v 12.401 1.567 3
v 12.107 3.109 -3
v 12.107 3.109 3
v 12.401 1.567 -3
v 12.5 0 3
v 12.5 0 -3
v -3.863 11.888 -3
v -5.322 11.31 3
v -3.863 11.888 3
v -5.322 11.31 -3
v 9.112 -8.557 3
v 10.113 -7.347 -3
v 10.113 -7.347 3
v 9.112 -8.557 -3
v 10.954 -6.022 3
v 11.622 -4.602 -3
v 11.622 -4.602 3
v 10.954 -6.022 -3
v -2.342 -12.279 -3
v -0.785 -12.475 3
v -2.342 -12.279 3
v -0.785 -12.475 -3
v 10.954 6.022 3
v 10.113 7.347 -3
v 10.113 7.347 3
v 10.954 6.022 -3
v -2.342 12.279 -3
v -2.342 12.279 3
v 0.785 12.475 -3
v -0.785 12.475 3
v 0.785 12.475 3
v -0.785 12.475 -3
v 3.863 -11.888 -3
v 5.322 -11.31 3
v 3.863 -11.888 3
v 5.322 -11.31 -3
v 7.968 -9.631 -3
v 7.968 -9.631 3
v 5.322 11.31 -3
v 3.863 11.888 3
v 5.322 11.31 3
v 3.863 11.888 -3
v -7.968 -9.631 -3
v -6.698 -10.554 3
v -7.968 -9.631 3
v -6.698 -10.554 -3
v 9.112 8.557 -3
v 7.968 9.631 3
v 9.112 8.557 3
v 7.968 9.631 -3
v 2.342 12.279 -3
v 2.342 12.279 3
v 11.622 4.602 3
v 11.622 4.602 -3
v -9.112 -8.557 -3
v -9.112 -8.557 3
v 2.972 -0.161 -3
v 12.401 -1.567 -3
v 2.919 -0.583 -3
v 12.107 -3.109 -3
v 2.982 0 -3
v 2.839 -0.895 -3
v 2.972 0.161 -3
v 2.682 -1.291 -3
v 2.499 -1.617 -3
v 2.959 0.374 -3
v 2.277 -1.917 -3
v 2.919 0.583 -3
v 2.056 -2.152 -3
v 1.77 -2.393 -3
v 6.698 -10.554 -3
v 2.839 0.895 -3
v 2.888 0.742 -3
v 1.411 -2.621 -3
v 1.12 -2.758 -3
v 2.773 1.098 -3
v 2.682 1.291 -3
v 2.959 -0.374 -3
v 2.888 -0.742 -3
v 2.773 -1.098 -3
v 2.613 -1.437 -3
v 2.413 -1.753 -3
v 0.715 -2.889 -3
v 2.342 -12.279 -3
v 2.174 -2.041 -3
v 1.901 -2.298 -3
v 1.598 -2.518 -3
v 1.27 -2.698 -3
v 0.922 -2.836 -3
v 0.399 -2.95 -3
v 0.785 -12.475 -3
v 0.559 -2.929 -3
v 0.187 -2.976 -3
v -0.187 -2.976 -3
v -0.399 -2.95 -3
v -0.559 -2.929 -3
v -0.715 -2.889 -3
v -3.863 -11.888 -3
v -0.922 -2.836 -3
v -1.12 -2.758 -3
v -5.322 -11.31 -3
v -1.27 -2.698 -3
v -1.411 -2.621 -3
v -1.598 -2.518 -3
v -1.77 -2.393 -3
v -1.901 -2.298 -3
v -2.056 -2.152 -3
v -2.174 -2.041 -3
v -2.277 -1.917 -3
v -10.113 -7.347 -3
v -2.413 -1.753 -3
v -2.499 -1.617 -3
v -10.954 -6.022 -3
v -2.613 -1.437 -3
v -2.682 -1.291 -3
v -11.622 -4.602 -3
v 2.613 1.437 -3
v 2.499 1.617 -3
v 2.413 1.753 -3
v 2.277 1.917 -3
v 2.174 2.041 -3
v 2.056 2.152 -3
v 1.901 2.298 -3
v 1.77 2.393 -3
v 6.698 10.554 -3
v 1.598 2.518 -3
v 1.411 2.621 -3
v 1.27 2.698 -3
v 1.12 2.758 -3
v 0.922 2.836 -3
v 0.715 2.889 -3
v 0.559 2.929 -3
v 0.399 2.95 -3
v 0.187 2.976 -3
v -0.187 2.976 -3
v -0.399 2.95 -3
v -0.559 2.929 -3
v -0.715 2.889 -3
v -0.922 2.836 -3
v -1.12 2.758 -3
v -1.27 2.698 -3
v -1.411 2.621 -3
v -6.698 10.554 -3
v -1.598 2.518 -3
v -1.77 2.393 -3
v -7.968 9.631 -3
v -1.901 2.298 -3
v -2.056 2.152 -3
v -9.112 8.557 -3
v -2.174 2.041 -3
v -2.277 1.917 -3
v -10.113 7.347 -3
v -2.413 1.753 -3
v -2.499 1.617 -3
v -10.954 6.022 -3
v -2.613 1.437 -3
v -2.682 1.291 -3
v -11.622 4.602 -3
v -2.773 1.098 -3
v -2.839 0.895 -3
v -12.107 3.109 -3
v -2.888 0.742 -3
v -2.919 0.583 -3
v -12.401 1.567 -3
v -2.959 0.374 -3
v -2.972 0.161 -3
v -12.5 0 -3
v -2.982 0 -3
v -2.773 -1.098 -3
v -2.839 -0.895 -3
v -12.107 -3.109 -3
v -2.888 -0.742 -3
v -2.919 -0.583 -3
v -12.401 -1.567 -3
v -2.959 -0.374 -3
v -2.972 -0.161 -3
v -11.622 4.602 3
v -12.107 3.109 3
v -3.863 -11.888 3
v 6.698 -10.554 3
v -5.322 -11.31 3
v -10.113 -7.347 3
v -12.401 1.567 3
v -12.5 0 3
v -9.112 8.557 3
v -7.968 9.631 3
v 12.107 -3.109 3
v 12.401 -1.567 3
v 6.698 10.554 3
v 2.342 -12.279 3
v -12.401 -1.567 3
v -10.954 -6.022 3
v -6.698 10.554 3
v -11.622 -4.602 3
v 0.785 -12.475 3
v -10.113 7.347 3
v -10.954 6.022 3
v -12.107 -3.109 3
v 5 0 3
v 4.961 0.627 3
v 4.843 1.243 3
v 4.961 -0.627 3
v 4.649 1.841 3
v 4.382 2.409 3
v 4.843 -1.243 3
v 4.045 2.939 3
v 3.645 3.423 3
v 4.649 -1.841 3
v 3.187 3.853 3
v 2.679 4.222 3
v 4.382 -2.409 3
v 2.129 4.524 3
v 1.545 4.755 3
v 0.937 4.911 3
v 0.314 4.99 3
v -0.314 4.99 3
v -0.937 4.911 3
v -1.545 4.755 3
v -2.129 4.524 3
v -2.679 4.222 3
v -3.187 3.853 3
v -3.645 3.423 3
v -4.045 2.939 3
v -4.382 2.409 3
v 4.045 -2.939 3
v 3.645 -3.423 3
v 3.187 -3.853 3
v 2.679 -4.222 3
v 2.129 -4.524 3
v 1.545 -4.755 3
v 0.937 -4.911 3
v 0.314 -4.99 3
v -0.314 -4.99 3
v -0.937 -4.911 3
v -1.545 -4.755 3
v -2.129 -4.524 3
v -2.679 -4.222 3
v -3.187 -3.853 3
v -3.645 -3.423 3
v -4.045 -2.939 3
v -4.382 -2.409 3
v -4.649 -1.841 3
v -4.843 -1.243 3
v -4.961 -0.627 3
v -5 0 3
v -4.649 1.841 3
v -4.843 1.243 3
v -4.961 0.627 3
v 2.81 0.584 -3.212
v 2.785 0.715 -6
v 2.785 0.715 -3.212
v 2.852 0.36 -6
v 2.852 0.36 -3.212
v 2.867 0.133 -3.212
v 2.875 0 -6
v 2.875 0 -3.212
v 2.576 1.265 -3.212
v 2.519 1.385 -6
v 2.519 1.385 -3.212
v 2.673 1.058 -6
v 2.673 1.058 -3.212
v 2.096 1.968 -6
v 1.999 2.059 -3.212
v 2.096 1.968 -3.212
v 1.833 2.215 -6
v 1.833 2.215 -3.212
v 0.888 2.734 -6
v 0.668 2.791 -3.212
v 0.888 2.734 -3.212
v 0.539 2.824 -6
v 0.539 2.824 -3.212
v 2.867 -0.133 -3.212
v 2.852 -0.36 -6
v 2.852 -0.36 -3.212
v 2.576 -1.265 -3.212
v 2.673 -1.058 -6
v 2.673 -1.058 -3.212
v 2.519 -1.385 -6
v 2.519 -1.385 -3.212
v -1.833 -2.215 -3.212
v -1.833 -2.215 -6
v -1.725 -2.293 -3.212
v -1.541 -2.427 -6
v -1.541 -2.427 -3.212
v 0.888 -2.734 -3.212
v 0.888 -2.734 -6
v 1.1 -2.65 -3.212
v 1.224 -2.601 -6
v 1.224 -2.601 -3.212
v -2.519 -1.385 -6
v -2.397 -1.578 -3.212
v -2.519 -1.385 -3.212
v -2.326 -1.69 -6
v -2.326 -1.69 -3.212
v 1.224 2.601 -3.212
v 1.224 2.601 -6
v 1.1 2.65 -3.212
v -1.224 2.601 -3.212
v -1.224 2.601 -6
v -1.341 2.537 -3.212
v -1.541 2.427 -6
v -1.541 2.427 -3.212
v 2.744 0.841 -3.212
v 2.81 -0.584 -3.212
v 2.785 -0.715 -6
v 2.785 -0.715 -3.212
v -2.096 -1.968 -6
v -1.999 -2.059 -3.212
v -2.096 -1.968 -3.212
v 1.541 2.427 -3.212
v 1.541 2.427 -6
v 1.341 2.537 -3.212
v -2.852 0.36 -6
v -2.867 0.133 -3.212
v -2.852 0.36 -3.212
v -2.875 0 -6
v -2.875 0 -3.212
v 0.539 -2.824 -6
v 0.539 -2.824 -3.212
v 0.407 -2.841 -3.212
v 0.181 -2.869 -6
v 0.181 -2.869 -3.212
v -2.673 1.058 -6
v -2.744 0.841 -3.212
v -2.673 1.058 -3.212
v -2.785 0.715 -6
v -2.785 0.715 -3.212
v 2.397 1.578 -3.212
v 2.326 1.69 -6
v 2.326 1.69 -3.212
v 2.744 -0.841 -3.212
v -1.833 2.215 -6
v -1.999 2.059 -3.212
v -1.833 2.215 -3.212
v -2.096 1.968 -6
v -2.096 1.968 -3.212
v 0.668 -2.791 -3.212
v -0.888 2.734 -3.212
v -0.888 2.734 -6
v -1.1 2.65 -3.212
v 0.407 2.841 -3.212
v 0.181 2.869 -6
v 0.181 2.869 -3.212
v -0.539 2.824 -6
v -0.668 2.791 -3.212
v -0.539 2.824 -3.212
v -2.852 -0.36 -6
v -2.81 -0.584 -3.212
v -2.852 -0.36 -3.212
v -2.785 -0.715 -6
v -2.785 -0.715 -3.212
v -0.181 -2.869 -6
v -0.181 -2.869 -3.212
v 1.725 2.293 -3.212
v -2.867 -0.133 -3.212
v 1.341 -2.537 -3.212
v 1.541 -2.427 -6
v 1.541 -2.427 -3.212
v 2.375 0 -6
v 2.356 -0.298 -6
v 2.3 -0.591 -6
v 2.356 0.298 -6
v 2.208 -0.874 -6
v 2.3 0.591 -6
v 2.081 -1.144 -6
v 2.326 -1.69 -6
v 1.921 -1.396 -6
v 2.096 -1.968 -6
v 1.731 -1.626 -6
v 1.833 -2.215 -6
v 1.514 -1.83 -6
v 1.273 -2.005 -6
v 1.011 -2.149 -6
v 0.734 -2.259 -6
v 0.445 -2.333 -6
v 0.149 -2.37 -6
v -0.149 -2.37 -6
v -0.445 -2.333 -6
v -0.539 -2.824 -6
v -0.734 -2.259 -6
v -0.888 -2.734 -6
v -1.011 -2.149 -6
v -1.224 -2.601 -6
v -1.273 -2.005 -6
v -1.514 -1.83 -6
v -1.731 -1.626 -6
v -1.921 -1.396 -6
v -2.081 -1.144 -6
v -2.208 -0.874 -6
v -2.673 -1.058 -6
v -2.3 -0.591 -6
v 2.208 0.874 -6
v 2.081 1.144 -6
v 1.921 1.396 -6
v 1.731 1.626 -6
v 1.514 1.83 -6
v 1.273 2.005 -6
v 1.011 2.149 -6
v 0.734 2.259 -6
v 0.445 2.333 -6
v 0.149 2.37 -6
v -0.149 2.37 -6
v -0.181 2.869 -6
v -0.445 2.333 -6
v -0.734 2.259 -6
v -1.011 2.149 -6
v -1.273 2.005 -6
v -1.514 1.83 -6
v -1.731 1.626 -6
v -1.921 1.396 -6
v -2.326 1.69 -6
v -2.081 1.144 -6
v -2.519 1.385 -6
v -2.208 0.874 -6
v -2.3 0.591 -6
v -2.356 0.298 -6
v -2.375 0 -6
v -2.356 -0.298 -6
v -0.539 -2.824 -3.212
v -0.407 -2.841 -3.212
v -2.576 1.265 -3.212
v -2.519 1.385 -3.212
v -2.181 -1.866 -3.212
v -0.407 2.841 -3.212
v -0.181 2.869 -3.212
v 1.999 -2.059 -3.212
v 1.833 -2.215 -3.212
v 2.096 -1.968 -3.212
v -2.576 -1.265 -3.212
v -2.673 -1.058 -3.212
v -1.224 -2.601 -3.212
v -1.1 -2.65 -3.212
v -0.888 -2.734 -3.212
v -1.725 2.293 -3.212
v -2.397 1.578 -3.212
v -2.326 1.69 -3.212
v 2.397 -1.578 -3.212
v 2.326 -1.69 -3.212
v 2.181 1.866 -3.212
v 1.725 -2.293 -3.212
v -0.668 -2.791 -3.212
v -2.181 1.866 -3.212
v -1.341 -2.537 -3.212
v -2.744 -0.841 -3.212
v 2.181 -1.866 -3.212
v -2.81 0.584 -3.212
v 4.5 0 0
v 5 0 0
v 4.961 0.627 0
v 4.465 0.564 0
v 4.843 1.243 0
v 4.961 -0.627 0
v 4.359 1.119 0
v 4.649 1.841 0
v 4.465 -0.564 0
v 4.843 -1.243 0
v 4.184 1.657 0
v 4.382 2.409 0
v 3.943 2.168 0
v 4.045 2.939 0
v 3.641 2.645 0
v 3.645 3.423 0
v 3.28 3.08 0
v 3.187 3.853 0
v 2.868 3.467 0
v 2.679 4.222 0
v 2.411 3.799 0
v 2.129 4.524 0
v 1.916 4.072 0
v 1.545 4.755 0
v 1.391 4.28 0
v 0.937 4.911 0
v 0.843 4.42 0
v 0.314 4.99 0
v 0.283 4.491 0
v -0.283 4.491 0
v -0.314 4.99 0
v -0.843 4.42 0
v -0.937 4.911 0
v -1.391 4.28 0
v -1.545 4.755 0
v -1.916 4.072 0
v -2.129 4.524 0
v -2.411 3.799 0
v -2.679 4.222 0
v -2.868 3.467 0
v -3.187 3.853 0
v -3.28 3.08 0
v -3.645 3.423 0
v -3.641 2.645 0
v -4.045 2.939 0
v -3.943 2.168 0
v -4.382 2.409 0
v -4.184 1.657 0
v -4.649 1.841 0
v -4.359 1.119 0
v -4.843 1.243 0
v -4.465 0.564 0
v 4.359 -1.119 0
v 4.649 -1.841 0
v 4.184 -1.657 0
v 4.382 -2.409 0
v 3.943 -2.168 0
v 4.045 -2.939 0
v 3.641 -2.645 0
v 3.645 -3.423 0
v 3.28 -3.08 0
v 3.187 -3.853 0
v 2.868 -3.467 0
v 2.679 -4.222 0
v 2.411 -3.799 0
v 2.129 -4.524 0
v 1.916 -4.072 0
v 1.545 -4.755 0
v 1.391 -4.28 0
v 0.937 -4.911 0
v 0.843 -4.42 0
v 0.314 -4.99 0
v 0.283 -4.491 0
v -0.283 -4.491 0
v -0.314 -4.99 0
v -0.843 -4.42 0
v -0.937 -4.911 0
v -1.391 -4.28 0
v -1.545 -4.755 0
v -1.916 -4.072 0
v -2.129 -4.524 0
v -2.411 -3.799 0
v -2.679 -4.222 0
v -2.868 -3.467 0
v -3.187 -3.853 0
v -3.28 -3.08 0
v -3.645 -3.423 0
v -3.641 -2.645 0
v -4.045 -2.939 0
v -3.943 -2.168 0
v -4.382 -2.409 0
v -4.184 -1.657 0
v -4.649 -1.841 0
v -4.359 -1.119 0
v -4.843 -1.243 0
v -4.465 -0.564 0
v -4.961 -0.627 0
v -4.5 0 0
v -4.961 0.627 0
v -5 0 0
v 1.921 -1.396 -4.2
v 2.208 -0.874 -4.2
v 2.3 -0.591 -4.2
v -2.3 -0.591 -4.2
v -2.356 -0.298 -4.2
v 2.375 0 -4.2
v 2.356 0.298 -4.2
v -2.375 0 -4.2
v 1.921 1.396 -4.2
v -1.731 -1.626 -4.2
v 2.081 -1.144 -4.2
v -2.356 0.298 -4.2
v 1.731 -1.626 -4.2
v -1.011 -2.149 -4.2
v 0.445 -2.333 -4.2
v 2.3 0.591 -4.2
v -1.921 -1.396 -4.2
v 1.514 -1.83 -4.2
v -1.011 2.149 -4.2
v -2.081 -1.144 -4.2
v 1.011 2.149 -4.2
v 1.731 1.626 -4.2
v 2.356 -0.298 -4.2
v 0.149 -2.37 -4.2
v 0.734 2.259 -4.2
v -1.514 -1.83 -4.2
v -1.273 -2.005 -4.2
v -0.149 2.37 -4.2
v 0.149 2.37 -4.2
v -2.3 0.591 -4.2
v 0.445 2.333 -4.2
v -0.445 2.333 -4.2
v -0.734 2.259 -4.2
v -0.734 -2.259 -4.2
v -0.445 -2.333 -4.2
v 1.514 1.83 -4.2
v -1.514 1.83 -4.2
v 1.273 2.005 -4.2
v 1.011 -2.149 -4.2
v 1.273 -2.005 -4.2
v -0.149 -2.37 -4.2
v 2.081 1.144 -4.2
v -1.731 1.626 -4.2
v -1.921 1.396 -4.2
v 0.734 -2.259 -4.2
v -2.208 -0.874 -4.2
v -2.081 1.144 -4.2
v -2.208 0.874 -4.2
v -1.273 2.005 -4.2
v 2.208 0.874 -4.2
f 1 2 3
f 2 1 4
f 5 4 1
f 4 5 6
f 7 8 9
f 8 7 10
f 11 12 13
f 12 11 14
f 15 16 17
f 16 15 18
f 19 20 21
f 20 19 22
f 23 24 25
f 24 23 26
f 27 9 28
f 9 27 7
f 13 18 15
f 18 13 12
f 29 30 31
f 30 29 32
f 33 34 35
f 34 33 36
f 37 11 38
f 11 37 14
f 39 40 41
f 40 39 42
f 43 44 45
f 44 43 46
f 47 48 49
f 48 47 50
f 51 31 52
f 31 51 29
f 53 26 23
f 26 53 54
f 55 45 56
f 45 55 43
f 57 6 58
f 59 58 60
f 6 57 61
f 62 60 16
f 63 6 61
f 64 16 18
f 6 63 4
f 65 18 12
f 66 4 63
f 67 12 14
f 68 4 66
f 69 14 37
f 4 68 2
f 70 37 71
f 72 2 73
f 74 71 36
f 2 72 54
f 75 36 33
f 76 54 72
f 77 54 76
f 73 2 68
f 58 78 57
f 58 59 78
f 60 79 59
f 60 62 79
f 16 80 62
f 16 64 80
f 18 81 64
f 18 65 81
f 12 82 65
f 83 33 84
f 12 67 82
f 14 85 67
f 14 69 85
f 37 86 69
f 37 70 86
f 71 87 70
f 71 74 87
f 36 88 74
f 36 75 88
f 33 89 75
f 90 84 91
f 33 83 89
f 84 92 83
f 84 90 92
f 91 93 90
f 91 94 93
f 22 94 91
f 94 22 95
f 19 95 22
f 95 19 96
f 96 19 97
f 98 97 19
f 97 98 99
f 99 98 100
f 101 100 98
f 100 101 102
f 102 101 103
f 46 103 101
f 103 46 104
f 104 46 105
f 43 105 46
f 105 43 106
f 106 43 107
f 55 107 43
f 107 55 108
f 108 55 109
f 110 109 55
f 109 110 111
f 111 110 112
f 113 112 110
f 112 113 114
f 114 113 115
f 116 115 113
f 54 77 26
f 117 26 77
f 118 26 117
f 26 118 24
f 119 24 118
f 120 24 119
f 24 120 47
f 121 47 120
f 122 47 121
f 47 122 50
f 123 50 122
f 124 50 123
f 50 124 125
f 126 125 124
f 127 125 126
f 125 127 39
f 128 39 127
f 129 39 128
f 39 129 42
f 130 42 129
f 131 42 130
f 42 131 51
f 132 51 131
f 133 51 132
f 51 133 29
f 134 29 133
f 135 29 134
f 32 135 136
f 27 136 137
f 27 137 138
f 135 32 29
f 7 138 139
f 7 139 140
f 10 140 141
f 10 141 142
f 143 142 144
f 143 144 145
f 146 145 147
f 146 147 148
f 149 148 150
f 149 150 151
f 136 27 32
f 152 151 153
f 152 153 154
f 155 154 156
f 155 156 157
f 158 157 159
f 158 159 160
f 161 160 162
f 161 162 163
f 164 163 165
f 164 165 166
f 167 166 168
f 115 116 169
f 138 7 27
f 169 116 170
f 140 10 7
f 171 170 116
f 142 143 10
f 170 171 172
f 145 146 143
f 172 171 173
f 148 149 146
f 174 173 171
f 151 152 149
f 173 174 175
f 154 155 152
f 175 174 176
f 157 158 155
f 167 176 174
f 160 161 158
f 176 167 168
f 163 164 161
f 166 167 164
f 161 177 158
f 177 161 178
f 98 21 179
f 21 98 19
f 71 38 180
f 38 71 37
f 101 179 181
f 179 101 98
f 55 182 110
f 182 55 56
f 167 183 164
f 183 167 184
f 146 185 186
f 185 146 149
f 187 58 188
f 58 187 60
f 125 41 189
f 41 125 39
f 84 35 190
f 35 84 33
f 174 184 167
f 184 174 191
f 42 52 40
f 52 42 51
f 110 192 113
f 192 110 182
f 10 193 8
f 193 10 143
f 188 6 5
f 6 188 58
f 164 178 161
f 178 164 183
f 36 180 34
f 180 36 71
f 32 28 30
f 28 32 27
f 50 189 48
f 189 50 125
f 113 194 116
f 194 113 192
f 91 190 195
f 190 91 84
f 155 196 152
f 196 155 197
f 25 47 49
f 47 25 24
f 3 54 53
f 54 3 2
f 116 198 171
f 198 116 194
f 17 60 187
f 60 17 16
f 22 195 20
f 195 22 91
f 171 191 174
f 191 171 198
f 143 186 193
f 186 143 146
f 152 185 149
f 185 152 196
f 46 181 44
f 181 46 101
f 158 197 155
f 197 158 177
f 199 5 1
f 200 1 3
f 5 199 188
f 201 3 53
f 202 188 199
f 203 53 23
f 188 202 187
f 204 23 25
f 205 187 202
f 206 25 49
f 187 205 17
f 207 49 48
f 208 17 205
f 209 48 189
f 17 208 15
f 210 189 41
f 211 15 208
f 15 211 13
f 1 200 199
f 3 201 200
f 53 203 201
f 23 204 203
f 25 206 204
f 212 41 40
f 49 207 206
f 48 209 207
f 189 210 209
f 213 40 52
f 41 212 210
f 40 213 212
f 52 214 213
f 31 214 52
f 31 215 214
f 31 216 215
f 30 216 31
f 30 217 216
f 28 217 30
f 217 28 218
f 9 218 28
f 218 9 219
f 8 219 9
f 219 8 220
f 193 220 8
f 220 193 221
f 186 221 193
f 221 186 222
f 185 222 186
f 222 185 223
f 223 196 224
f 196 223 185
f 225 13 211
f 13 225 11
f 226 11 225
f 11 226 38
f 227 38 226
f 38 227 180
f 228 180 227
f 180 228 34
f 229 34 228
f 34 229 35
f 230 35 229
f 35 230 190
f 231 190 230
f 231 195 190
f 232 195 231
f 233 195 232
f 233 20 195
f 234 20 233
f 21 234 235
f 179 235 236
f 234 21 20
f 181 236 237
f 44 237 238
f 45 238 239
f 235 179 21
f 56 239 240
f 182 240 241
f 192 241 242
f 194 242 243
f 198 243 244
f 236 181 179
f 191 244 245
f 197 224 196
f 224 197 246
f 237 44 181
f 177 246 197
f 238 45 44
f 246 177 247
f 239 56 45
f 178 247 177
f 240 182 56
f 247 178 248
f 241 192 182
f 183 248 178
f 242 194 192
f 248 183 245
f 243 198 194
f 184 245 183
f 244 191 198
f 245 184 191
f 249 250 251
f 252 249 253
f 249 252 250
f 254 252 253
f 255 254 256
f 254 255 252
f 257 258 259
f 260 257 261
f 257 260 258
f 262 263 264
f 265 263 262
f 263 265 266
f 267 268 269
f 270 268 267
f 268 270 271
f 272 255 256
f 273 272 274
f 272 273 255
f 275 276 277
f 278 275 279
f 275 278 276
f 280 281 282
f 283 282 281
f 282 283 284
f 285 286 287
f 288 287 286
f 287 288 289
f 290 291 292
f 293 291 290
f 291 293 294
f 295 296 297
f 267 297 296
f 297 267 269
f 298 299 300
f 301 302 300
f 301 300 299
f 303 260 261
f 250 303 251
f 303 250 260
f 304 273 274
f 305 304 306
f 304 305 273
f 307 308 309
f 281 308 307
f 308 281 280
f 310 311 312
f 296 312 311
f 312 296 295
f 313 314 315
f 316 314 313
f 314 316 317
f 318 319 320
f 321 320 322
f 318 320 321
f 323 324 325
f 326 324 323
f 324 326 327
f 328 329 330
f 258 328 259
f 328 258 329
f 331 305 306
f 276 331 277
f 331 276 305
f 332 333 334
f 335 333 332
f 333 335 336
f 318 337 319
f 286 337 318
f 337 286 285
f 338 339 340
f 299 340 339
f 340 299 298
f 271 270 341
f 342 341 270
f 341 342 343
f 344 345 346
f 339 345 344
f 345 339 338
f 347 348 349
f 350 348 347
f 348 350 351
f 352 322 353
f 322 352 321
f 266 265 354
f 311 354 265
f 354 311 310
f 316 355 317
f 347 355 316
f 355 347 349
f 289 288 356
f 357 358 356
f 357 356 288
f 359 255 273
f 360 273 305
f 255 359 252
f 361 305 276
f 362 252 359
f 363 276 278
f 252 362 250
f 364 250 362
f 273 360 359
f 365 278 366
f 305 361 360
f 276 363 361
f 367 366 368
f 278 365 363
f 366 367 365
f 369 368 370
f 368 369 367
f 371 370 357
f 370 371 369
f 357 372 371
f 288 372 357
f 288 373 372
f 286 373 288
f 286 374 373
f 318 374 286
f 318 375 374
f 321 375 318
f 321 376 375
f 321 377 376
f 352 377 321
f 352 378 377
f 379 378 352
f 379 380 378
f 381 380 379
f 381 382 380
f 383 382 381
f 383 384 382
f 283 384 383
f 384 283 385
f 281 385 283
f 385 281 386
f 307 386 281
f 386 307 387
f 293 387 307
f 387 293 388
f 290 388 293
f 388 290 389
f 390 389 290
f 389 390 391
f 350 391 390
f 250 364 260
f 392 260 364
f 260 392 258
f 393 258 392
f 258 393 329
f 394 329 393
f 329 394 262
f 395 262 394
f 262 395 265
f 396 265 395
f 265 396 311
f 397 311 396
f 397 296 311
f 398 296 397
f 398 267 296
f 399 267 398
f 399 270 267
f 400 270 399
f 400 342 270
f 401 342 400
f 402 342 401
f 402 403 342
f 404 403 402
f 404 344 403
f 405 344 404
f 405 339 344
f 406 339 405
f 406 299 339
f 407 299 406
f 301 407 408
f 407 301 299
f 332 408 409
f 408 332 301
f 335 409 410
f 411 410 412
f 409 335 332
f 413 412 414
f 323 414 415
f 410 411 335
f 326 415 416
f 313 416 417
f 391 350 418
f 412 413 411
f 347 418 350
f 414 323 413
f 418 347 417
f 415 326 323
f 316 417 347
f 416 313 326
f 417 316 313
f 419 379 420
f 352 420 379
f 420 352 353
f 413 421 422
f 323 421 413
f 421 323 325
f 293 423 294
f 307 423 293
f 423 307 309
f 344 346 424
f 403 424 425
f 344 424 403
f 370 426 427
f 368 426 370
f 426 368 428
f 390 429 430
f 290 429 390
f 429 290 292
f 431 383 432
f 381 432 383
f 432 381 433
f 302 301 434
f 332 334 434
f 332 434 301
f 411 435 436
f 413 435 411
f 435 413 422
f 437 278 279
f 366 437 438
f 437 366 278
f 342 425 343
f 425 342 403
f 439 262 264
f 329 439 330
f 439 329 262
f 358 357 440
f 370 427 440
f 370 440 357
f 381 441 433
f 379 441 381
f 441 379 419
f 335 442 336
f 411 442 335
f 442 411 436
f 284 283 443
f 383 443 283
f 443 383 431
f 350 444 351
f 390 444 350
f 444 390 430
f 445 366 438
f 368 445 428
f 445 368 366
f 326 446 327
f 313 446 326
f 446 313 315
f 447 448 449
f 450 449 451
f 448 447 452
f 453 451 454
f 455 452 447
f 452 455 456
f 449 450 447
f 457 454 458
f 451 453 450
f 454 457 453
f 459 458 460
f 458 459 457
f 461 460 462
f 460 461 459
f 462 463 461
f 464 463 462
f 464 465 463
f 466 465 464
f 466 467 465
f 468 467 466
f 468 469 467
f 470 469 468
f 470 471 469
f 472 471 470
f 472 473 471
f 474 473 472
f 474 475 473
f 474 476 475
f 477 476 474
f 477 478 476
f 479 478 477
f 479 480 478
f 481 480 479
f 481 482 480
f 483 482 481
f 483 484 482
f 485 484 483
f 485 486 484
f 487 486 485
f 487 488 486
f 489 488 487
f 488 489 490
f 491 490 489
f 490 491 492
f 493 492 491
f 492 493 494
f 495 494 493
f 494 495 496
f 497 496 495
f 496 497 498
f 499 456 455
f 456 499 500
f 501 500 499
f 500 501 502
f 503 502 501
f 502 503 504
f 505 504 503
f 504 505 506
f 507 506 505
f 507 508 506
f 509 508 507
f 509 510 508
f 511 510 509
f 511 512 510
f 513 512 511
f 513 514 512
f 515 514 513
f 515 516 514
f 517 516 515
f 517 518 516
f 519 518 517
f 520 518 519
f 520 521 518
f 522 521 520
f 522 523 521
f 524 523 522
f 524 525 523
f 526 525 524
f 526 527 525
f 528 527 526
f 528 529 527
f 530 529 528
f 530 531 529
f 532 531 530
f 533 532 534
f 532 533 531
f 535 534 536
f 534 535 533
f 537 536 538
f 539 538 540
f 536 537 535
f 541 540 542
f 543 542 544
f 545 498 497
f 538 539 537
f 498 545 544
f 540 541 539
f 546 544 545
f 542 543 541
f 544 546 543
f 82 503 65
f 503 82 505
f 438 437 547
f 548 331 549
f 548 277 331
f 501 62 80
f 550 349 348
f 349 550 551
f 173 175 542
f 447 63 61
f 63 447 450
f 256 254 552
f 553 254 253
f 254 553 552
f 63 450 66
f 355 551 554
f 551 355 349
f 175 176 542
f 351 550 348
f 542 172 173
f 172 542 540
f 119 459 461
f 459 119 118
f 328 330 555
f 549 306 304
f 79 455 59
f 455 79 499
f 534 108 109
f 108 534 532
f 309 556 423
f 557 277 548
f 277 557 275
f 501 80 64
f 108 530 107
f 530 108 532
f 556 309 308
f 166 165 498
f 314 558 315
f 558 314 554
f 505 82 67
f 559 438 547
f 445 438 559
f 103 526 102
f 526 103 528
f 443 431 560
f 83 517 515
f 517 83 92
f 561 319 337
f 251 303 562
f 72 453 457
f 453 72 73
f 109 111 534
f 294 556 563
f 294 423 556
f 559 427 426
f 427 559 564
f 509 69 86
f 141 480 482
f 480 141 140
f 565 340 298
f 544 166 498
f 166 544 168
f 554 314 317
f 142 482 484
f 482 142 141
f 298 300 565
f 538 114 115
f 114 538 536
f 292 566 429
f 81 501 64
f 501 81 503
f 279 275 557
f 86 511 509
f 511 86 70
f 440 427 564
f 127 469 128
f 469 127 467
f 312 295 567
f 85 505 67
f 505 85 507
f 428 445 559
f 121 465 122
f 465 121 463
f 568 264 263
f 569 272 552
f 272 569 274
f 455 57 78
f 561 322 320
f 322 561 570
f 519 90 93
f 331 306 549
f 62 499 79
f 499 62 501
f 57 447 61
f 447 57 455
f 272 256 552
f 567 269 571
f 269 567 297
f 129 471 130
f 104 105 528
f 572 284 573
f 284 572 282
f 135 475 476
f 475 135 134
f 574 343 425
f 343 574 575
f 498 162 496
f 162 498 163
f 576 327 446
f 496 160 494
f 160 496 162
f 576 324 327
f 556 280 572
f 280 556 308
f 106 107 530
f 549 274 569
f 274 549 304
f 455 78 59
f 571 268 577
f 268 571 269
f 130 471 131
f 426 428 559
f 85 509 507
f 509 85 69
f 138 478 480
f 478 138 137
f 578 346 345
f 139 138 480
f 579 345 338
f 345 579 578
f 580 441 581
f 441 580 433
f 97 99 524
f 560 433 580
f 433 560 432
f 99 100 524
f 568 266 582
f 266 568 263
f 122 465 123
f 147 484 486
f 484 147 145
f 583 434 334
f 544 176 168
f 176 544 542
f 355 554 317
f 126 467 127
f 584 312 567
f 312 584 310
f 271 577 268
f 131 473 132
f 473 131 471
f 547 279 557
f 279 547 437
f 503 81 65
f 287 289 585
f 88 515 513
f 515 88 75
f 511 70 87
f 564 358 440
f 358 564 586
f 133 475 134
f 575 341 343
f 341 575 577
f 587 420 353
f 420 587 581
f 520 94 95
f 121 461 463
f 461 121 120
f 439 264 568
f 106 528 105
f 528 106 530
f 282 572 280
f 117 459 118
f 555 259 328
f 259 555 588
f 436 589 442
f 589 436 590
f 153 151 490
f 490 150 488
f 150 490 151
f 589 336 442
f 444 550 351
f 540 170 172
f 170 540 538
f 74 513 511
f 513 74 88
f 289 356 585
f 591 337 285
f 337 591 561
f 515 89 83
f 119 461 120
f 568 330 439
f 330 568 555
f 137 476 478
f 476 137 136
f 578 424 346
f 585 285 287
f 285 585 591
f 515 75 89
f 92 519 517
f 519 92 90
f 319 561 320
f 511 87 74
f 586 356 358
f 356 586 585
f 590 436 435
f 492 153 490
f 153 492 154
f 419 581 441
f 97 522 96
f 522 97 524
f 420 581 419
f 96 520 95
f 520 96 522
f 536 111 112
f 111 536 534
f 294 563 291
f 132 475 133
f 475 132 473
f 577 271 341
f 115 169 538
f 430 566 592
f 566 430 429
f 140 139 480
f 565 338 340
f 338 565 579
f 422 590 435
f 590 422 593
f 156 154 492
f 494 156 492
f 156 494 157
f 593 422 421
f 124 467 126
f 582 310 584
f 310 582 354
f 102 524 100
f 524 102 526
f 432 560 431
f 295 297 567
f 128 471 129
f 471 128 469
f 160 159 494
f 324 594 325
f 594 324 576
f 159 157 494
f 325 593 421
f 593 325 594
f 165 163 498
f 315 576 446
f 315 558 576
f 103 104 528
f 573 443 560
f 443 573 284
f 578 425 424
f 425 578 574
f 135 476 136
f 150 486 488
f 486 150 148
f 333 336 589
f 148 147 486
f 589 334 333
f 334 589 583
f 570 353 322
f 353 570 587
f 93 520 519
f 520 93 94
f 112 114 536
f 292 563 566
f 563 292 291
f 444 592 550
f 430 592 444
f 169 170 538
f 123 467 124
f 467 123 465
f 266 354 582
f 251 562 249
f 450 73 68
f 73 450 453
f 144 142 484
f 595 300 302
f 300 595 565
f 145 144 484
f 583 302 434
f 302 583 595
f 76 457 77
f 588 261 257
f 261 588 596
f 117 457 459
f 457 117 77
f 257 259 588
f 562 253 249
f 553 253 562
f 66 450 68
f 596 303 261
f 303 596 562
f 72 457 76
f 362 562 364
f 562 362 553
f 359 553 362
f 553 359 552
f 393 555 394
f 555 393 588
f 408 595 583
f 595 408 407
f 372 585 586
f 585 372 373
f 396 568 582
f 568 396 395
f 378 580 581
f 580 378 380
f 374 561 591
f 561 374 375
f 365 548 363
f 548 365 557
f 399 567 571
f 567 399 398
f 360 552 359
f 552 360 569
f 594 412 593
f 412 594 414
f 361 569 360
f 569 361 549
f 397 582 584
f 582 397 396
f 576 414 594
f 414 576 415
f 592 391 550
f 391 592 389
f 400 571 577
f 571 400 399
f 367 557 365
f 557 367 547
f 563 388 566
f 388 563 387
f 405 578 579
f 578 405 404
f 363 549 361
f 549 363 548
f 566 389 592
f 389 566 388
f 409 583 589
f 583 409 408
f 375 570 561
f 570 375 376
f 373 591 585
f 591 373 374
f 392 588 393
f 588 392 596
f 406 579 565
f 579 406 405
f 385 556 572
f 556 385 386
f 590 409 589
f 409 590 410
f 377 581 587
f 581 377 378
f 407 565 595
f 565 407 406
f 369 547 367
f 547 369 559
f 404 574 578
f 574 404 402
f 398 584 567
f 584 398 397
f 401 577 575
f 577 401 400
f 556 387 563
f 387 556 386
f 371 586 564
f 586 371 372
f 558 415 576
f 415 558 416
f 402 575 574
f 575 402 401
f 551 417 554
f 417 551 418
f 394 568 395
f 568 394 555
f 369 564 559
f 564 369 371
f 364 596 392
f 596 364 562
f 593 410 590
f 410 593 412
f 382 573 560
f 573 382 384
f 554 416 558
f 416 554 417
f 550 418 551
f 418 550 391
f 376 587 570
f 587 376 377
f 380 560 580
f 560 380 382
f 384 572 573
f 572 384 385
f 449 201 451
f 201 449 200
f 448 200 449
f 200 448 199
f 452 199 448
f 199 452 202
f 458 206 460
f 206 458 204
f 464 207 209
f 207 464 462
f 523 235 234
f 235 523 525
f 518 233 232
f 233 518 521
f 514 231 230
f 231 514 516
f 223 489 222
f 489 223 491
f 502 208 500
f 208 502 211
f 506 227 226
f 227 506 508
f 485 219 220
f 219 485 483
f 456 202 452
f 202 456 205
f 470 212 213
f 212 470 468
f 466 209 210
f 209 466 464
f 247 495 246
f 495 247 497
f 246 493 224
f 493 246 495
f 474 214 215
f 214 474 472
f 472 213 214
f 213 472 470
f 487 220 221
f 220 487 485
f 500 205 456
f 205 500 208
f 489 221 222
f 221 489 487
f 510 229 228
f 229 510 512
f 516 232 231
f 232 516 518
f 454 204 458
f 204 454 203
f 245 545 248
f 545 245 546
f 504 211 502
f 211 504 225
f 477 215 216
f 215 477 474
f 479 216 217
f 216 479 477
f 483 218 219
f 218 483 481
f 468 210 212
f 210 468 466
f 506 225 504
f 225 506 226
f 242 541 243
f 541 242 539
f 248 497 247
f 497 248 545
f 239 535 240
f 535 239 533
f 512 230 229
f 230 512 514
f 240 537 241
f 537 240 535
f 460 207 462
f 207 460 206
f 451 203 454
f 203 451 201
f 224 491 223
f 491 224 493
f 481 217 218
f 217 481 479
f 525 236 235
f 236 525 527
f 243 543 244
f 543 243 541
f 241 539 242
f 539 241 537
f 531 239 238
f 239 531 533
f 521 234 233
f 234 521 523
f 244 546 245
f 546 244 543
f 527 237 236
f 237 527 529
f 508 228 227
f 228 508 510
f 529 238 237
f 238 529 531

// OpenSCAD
$fn = 50;

difference() {
	union() {
		translate(v = [0, 0, -3.0]) {
			cylinder(h = 6, r = 12.5);
		}
		#translate(v = [0, 0, -6.0]) {
			cylinder(h = 6, r = 2.875);
		}
	}
	union() {
		translate(v = [0, 0, 0]) {
			rotate(a = [0, 0, 0]) {
				difference() {
					union() {
						translate(v = [0, 0, -6.0]) {
							cylinder(h = 6, r = 2.25);
						}
						translate(v = [0, 0, -4.2]) {
							cylinder(h = 4.2, r1 = 2.375, r2 = 4.5);
						}
						translate(v = [0, 0, -6.0]) {
							cylinder(h = 6, r = 2.375);
						}
						translate(v = [0, 0, -6.0]) {
							cylinder(h = 6, r = 2.25);
						}
					}
					union();
				}
			}
		}
		#cylinder(h = 3, r = 5.0);
	}
}
